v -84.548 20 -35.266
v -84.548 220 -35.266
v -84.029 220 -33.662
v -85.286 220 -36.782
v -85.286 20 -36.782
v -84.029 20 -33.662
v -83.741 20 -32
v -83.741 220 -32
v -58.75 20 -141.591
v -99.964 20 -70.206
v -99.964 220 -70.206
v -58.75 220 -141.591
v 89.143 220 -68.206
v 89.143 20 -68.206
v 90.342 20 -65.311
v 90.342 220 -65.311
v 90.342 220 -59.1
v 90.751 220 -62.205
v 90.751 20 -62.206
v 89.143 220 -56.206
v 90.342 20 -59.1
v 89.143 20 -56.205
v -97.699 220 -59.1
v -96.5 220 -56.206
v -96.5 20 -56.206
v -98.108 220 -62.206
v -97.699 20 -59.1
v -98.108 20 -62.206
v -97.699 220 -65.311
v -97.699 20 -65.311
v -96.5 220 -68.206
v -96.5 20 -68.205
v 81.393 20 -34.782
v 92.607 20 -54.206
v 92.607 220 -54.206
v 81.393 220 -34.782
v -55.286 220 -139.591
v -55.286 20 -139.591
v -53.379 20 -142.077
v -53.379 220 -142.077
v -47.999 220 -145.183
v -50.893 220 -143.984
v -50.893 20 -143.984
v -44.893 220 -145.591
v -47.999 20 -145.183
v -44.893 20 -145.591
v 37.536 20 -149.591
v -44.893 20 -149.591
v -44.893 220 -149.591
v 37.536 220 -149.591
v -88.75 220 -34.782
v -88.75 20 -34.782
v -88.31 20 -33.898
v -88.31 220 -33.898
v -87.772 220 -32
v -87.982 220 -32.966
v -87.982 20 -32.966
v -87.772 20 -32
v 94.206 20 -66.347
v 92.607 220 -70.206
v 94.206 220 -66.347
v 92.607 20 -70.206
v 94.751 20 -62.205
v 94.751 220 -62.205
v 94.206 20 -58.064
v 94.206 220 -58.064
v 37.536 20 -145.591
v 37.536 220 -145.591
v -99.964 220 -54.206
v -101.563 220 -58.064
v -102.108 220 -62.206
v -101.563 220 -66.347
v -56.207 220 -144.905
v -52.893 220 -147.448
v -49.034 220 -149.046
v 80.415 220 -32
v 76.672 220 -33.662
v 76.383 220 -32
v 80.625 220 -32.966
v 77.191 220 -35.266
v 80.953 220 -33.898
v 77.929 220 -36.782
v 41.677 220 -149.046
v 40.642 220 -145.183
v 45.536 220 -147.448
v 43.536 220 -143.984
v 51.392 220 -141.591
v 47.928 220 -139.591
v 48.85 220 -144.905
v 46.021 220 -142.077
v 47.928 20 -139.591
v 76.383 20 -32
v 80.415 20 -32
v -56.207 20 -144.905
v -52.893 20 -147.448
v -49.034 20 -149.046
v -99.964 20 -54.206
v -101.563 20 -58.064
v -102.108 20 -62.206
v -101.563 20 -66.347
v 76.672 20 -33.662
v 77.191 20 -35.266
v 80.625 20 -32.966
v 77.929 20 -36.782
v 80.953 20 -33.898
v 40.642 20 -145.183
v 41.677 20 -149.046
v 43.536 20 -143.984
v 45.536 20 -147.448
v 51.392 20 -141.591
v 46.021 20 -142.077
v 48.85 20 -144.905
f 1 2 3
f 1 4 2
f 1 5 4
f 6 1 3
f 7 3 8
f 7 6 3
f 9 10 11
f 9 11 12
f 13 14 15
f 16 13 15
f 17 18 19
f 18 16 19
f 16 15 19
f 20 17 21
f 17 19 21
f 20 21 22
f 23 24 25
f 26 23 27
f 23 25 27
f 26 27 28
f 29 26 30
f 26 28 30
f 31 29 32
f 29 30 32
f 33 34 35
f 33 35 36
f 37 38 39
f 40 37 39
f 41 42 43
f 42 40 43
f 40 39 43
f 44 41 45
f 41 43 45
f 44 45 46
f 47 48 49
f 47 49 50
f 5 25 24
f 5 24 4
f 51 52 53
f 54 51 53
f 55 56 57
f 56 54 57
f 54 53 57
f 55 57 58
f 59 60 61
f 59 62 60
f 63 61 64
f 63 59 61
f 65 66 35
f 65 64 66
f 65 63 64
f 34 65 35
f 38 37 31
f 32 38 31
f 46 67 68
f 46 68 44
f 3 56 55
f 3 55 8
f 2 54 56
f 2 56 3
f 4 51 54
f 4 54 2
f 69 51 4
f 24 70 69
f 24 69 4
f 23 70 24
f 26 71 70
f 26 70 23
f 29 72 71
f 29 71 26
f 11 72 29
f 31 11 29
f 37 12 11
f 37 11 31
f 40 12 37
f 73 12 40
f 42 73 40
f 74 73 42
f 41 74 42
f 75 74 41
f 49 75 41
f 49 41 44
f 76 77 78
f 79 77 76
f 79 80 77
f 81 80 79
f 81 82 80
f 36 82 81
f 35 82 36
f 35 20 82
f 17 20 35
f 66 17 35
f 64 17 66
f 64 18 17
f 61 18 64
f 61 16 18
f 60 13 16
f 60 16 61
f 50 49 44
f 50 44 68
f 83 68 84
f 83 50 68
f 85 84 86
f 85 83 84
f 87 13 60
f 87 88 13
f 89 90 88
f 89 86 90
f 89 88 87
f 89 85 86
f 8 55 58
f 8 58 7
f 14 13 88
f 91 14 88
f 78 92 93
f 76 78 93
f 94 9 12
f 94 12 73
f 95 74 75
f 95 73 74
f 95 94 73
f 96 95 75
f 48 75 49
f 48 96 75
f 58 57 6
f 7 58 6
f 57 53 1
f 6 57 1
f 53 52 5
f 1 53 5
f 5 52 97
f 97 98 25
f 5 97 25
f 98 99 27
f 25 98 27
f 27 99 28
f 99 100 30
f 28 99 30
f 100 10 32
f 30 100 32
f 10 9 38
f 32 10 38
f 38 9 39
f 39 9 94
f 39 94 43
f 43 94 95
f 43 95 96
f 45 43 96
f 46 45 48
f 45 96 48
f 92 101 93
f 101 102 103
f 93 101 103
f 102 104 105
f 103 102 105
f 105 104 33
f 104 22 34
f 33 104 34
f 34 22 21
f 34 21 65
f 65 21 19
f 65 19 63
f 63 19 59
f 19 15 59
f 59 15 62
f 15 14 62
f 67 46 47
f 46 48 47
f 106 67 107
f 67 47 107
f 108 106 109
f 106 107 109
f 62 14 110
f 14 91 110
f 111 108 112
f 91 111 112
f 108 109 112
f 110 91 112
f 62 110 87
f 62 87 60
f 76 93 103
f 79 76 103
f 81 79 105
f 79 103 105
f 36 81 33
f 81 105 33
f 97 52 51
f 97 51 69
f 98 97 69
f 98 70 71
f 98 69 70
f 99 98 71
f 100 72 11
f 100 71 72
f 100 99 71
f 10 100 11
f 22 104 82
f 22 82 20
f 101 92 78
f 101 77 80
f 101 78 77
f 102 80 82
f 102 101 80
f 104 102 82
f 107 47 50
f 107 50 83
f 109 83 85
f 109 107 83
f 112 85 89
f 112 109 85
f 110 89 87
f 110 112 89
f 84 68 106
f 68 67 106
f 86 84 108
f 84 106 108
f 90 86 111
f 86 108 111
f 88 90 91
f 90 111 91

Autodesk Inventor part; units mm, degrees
ref_plane "YZ Plane" through (0, 0, 0) normal (1, 0, 0) x (0, 1, 0)
ref_plane "XZ Plane" through (0, 0, 0) normal (0, 1, 0) x (-1, 0, 0)
ref_plane "XY Plane" through (0, 0, 0) normal (0, 0, 1) x (1, 0, 0)
sketch "Sketch1" plane through (0, 0, 0) normal (0, 1, 0) x (-1, 0, 0)
  line L0 (83.6786, 197.7945) -> (-76.3214, 197.7945)
  line L1 (-76.3214, 197.7945) -> (-76.3214, -52.2055)
  line L2 (-76.3214, -52.2055) -> (83.6786, -52.2055)
  line L3 (83.6786, -52.2055) -> (83.6786, 197.7945)
  circle A0 centre (3.6786, -62.2055) radius 80
  line L4 (83.6786, -52.2055) -> (83.6786, -62.2055)
  line L5 (-76.3214, -52.2055) -> (-76.3214, -62.2055)
  circle A1 centre (3.6786, -62.2055) radius 26
  circle A2 centre (3.6786, -62.2055) radius 40
  point P0 (0, 0)
  point P1 (59.3929, -23.6341)
  point P2 (-75.6939, -52.2055)
  point P3 (83.0512, -52.2055)
  dimension "d0" = 250
  dimension "d1" = 160
  dimension "d2" = 160
  dimension "d3" = 10
  dimension "d4" = 52
  dimension "d5" = 80
extrude "Extrusion1" add sketch "Sketch1" along normal blind 20 contours L3 L2 A0 L1 L0 | L4 A0 L2 | L2 A0 L5 | A0 L2 A2 | L2 A2 A0 | A2 L2 A1 | L2 A1 A2
sketch "Sketch2" plane through (0, 20, 0) normal (0, 1, 0) x (1, 0, 0)
  circle A0 centre (-3.6786, 62.2055) radius 26 projected
  circle A1 centre (-3.6786, 62.2055) radius 26
  circle A2 centre (-3.6786, 62.2055) radius 17
  point P0 (0, 0)
  dimension "d8" = 34
extrude "Extrusion2" add sketch "Sketch2" against normal blind 5
sketch "Sketch3" plane through (0, 0, 0) normal (0, -1, 0) x (1, 0, 0)
  circle A0 centre (-3.6786, -62.2055) radius 75
  circle A1 centre (-3.6786, -62.2055) radius 75
  line L0 (92.6071, -62.2055) -> (44.4642, -145.5914)
  line L1 (44.4642, -145.5914) -> (-51.8215, -145.5914)
  line L2 (-51.8215, -145.5914) -> (-99.9643, -62.2055)
  line L3 (-99.9643, -62.2055) -> (-51.8215, 21.1804)
  line L4 (-51.8215, 21.1804) -> (44.4642, 21.1804)
  line L5 (44.4642, 21.1804) -> (92.6071, -62.2055)
  line L6 (80.6071, -62.2055) -> (38.4642, -135.1991)
  line L7 (38.4642, -135.1991) -> (-45.8215, -135.1991)
  line L8 (-45.8215, -135.1991) -> (-87.9643, -62.2055)
  line L9 (-87.9643, -62.2055) -> (-45.8215, 10.7881)
  line L10 (-45.8215, 10.7881) -> (38.4642, 10.7881)
  line L11 (38.4642, 10.7881) -> (80.6071, -62.2055)
  circle A2 centre (80.6071, -62.2055) radius 5
  circle A3 centre (38.4642, 10.7881) radius 5
  circle A4 centre (-45.8215, 10.7881) radius 5
  circle A5 centre (-87.9643, -62.2055) radius 5
  circle A6 centre (-45.8215, -135.1991) radius 5
  circle A7 centre (38.4642, -135.1991) radius 5
  circle A8 centre (-3.6786, -62.2055) radius 26 projected
  circle A9 centre (-3.6786, -62.2055) radius 0.8535
  point P0 (0, 0)
  point P1 (-59.3929, -100.7769)
  point P2 (-3.6786, -62.2055)
  dimension "d13" = 360
sketch "Sketch4" plane through (0, 0, 0) normal (0, -1, 0) x (1, 0, 0)
  circle A0 centre (-45.8215, -135.1991) radius 5
  line L0 (-45.8215, -135.1991) -> (-87.9643, -62.2055)
  line L1 (-51.8215, -145.5914) -> (-99.9643, -62.2055)
  circle A1 centre (-87.9643, -62.2055) radius 5
  circle A2 centre (-45.8215, 10.7881) radius 5
  line L2 (-87.9643, -62.2055) -> (-45.8215, 10.7881)
  line L3 (-99.9643, -62.2055) -> (-51.8215, 21.1804)
  line L4 (38.4642, -135.1991) -> (-45.8215, -135.1991)
  circle A3 centre (38.4642, -135.1991) radius 5
  line L5 (44.4642, -145.5914) -> (-51.8215, -145.5914)
  line L6 (80.6071, -62.2055) -> (38.4642, -135.1991)
  line L7 (92.6071, -62.2055) -> (44.4642, -145.5914)
  circle A4 centre (-3.6786, -62.2055) radius 75
  circle A5 centre (-3.6786, -62.2055) radius 75
  line L8 (-45.8215, 10.7881) -> (38.4642, 10.7881)
  line L9 (-51.8215, 21.1804) -> (44.4642, 21.1804)
  circle A6 centre (80.6071, -62.2055) radius 5
  circle A7 centre (38.4642, 10.7881) radius 5
  line L10 (38.4642, 10.7881) -> (80.6071, -62.2055)
  line L11 (44.4642, 21.1804) -> (92.6071, -62.2055)
  circle A8 centre (-3.6786, -62.2055) radius 26
  circle A9 centre (-3.6786, -62.2055) radius 17 projected
  circle A10 centre (-3.6786, -62.2055) radius 2.3214
  point P0 (0, 0)
  point P1 (0, 0)
  point P2 (-59.3929, -100.7769)
  dimension "d18" = 360
extrude "Extrusion3" cut sketch "Sketch3" against normal blind 22 contours A2 L6 L11 | L11 L6 A2 | A3 L10 L11 | L11 L10 A3 | A7 L7 L6 | L6 L7 A7 | A4 L9 L10 | L10 L9 A4 | A6 L8 L7 | L7 L8 A6 | A5 L8 L9 | L9 L8 A5
extrude "Extrusion4" add sketch "Sketch4" against normal blind 20 contours A0 L0 A4 L4 | A4 L6 A3 L4 | L0 A1 L2 A4 | A4 L10 A6 L6 | L2 A2 L8 A4 | L8 A7 L10 A4 | L1 L3 L9 L11 L7 L5
sketch "Sketch5" plane through (0, 0, 0) normal (0, -1, 0) x (1, 0, 0)
  circle A0 centre (-3.6786, -62.2055) radius 17 projected
  circle A1 centre (-3.6786, -62.2055) radius 79.2857
  circle A2 centre (80.6071, -62.2055) radius 5 projected
  circle A3 centre (-3.6786, -62.2055) radius 75
  point P0 (0, 0)
  dimension "d21" = 150
extrude "Extrusion5" add sketch "Sketch5" along normal blind 5 contours A1
fillet "Fillet1" radius 12 4 edges at (-99.9643, 10, -62.2055) (-51.8215, 10, -145.5914) (44.4642, 10, -145.5914) (92.6071, 10, -62.2055)
sketch "Sketch6" plane through (0, 0, 0) normal (0, -1, 0) x (1, 0, 0)
  arc A0 (89.143, -68.2055) -> (89.143, -56.2055) centre (78.7507, -62.2055) ccw projected
  line L0 (89.143, -56.2055) -> (77.9291, -36.7824) projected
  arc A1 (76.3214, -30.7824) -> (77.9291, -36.7824) centre (88.3214, -30.7824) ccw projected
  line L1 (76.3214, 197.7945) -> (76.3214, -30.7824) projected
  line L2 (-83.6786, 197.7945) -> (76.3214, 197.7945) projected
  line L3 (-83.6786, -30.7824) -> (-83.6786, 197.7945) projected
  arc A2 (-85.2863, -36.7824) -> (-83.6786, -30.7824) centre (-95.6786, -30.7824) ccw projected
  line L4 (-85.2863, -36.7824) -> (-96.5002, -56.2055) projected
  arc A3 (-96.5002, -56.2055) -> (-96.5002, -68.2055) centre (-86.1079, -62.2055) ccw projected
  line L5 (-96.5002, -68.2055) -> (-55.2856, -139.5914) projected
  arc A4 (-55.2856, -139.5914) -> (-44.8933, -145.5914) centre (-44.8933, -133.5914) ccw projected
  line L6 (-44.8933, -145.5914) -> (37.536, -145.5914) projected
  arc A5 (37.536, -145.5914) -> (47.9283, -139.5914) centre (37.536, -133.5914) ccw projected
  line L7 (47.9283, -139.5914) -> (89.143, -68.2055) projected
  circle A6 centre (-87.9643, -62.2055) radius 5 projected
  arc A7 (-43.3215, 6.4579) -> (-82.9643, -62.2055) centre (-3.6786, -62.2055) ccw projected
  circle A8 centre (-45.8215, 10.7881) radius 5 projected
  arc A9 (35.9642, 6.4579) -> (-43.3215, 6.4579) centre (-3.6786, -62.2055) ccw projected
  circle A10 centre (38.4642, 10.7881) radius 5 projected
  arc A11 (75.6071, -62.2055) -> (35.9642, 6.4579) centre (-3.6786, -62.2055) ccw projected
  circle A12 centre (80.6071, -62.2055) radius 5 projected
  arc A13 (35.9642, -130.869) -> (75.6071, -62.2055) centre (-3.6786, -62.2055) ccw projected
  circle A14 centre (38.4642, -135.1991) radius 5 projected
  arc A15 (-43.3215, -130.869) -> (35.9642, -130.869) centre (-3.6786, -62.2055) ccw projected
  circle A16 centre (-45.8215, -135.1991) radius 5 projected
  arc A17 (-82.9643, -62.2055) -> (-43.3215, -130.869) centre (-3.6786, -62.2055) ccw projected
  arc A18 (56.3214, -30.7824) -> (60.6086, -46.7824) centre (88.3214, -30.7824) ccw
  line L8 (60.6086, -46.7824) -> (69.5131, -62.2055)
  line L9 (69.5131, -62.2055) -> (32.9172, -125.5914)
  line L10 (32.9172, -125.5914) -> (-40.2745, -125.5914)
  line L11 (-40.2745, -125.5914) -> (-76.8703, -62.2055)
  line L12 (-76.8703, -62.2055) -> (-67.9658, -46.7824)
  arc A19 (-67.9658, -46.7824) -> (-63.6786, -30.7824) centre (-95.6786, -30.7824) ccw
  line L13 (-63.6786, -30.7824) -> (-63.6786, 177.7945)
  line L14 (-63.6786, 177.7945) -> (56.3214, 177.7945)
  line L15 (56.3214, 177.7945) -> (56.3214, -30.7824)
  arc A20 (-53.3215, 23.7784) -> (-102.9643, -62.2055) centre (-3.6786, -62.2055) ccw
  arc A21 (-102.9643, -62.2055) -> (-53.3215, -148.1895) centre (-3.6786, -62.2055) ccw
  arc A22 (-53.3215, -148.1895) -> (45.9642, -148.1895) centre (-3.6786, -62.2055) ccw
  arc A23 (45.9642, -148.1895) -> (95.6071, -62.2055) centre (-3.6786, -62.2055) ccw
  arc A24 (95.6071, -62.2055) -> (45.9642, 23.7784) centre (-3.6786, -62.2055) ccw
  arc A25 (45.9642, 23.7784) -> (-53.3215, 23.7784) centre (-3.6786, -62.2055) ccw
  point P0 (0, 0)
  point P1 (-63.6786, 16.8998)
  point P2 (56.3214, 16.8998)
  dimension "d25" = 20
  dimension "d26" = 20
extrude "Extrusion6" cut sketch "Sketch6" against normal blind 12
sketch "Sketch7" plane through (0, 0, 0) normal (0, -1, 0) x (1, 0, 0)
  circle A0 centre (-3.6786, 22.0805) radius 5
  circle A1 centre (-3.6786, -62.2055) radius 17 projected
  circle A2 centre (-25.4934, 19.2085) radius 5
  circle A3 centre (-45.8216, 10.7883) radius 5
  circle A4 centre (-63.2778, -2.6063) radius 5
  circle A5 centre (-76.6724, -20.0625) radius 5
  circle A6 centre (-85.0926, -40.3907) radius 5
  circle A7 centre (-87.9646, -62.2055) radius 5
  circle A8 centre (-85.0926, -84.0203) radius 5
  circle A9 centre (-76.6724, -104.3485) radius 5
  circle A10 centre (-63.2778, -121.8047) radius 5
  circle A11 centre (-45.8216, -135.1993) radius 5
  circle A12 centre (-25.4934, -143.6195) radius 5
  circle A13 centre (-3.6786, -146.4915) radius 5
  circle A14 centre (18.1362, -143.6195) radius 5
  circle A15 centre (38.4644, -135.1993) radius 5
  circle A16 centre (55.9206, -121.8047) radius 5
  circle A17 centre (69.3152, -104.3485) radius 5
  circle A18 centre (77.7354, -84.0203) radius 5
  circle A19 centre (80.6074, -62.2055) radius 5
  circle A20 centre (77.7354, -40.3907) radius 5
  circle A21 centre (69.3152, -20.0625) radius 5
  circle A22 centre (55.9206, -2.6063) radius 5
  circle A23 centre (38.4644, 10.7883) radius 5
  circle A24 centre (18.1362, 19.2085) radius 5
  point P0 (0, 0)
  dimension "d29" = 84.286
  dimension "d30" = 10
  dimension "d33" = 360
extrude "Extrusion7" cut sketch "Sketch7" against normal blind 39 contours A0 | A2 | A4 | A5 | A21 | A22 | A24
sketch "Sketch8" plane through (0, 20, 0) normal (0, 1, 0) x (1, 0, 0)
  circle A0 centre (18.1362, -19.2085) radius 5 projected
  circle A1 centre (-76.6724, 20.0625) radius 5 projected
  circle A2 centre (55.9206, 2.6063) radius 5 projected
  circle A3 centre (-3.6786, -22.0805) radius 5 projected
  circle A4 centre (-63.2778, 2.6063) radius 5 projected
  circle A5 centre (69.3152, 20.0625) radius 5 projected
  circle A6 centre (-25.4934, -19.2085) radius 5 projected
  arc A7 (89.143, 56.2055) -> (89.143, 68.2055) centre (78.7507, 62.2055) ccw projected
  line L0 (89.143, 68.2055) -> (47.9283, 139.5914) projected
  arc A8 (47.9283, 139.5914) -> (37.536, 145.5914) centre (37.536, 133.5914) ccw projected
  line L1 (37.536, 145.5914) -> (-44.8933, 145.5914) projected
  arc A9 (-44.8933, 145.5914) -> (-55.2856, 139.5914) centre (-44.8933, 133.5914) ccw projected
  line L2 (-55.2856, 139.5914) -> (-96.5002, 68.2055) projected
  arc A10 (-96.5002, 68.2055) -> (-96.5002, 56.2055) centre (-86.1079, 62.2055) ccw projected
  line L3 (-96.5002, 56.2055) -> (-85.2863, 36.7824) projected
  arc A11 (-83.6786, 30.7824) -> (-85.2863, 36.7824) centre (-95.6786, 30.7824) ccw projected
  line L4 (-83.6786, 30.7824) -> (-83.6786, -197.7945) projected
  line L5 (-83.6786, -197.7945) -> (76.3214, -197.7945) projected
  line L6 (76.3214, -197.7945) -> (76.3214, 30.7824) projected
  arc A12 (77.9291, 36.7824) -> (76.3214, 30.7824) centre (88.3214, 30.7824) ccw projected
  line L7 (77.9291, 36.7824) -> (89.143, 56.2055) projected
  circle A13 centre (-3.6786, 62.2055) radius 17 projected
  circle A14 centre (38.4642, -10.7881) radius 5 projected
  circle A15 centre (-45.8215, -10.7881) radius 5 projected
  circle A16 centre (80.6071, 62.2055) radius 5 projected
  circle A17 centre (38.4642, 135.1991) radius 5 projected
  circle A18 centre (-45.8215, 135.1991) radius 5 projected
  circle A19 centre (-87.9643, 62.2055) radius 5 projected
  line L8 (51.3924, 141.5914) -> (92.6071, 70.2055)
  arc A20 (92.6071, 54.2055) -> (92.6071, 70.2055) centre (78.7507, 62.2055) ccw
  line L9 (92.6071, 54.2055) -> (81.3932, 34.7824)
  arc A21 (81.3932, 34.7824) -> (80.3214, 30.7824) centre (88.3214, 30.7824) ccw
  line L10 (80.3214, 30.7824) -> (80.3214, -201.7945)
  line L11 (80.3214, -201.7945) -> (-87.6786, -201.7945)
  line L12 (-87.6786, -201.7945) -> (-87.6786, 30.7824)
  arc A22 (-87.6786, 30.7824) -> (-88.7504, 34.7824) centre (-95.6786, 30.7824) ccw
  line L13 (-88.7504, 34.7824) -> (-99.9643, 54.2055)
  arc A23 (-99.9643, 70.2055) -> (-99.9643, 54.2055) centre (-86.1079, 62.2055) ccw
  line L14 (-99.9643, 70.2055) -> (-58.7497, 141.5914)
  arc A24 (-44.8933, 149.5914) -> (-58.7497, 141.5914) centre (-44.8933, 133.5914) ccw
  line L15 (-44.8933, 149.5914) -> (37.536, 149.5914)
  arc A25 (51.3924, 141.5914) -> (37.536, 149.5914) centre (37.536, 133.5914) ccw
  line L16 (80.3214, 30.7824) -> (80.3214, 12)
  line L17 (-87.6786, 12) -> (-87.6786, 30.7824)
  line L18 (-90, 32) -> (98, 32)
  line L19 (98, 32) -> (98, 12)
  line L20 (98, 12) -> (-90, 12)
  line L21 (-90, 12) -> (-90, 32)
  point P0 (0, 0)
  point P1 (76.3833, 32)
  point P2 (80.4146, 32)
  point P3 (-87.7718, 32)
  point P4 (-83.7405, 32)
  dimension "d37" = 4
extrude "Extrusion8" add sketch "Sketch8" along normal blind 200 contours A7 L0 A8 L1 A9 L2 A10 L3 A11 L18 A22 L13 A23 L14 A24 L15 A25 L8 A20 L9 A21 A12 L7
sketch "Sketch9" plane through (0, 20, 0) normal (0, 1, 0) x (1, 0, 0)
  circle A0 centre (18.1362, -19.2085) radius 5 projected
  circle A1 centre (-76.6724, 20.0625) radius 5 projected
  circle A2 centre (55.9206, 2.6063) radius 5 projected
  circle A3 centre (-3.6786, -22.0805) radius 5 projected
  circle A4 centre (-63.2778, 2.6063) radius 5 projected
  circle A5 centre (69.3152, 20.0625) radius 5 projected
  circle A6 centre (-25.4934, -19.2085) radius 5 projected
  arc A7 (89.143, 56.2055) -> (89.143, 68.2055) centre (78.7507, 62.2055) ccw projected
  line L0 (89.143, 68.2055) -> (47.9283, 139.5914) projected
  arc A8 (47.9283, 139.5914) -> (37.536, 145.5914) centre (37.536, 133.5914) ccw projected
  line L1 (37.536, 145.5914) -> (-44.8933, 145.5914) projected
  arc A9 (-44.8933, 145.5914) -> (-55.2856, 139.5914) centre (-44.8933, 133.5914) ccw projected
  line L2 (-55.2856, 139.5914) -> (-96.5002, 68.2055) projected
  arc A10 (-96.5002, 68.2055) -> (-96.5002, 56.2055) centre (-86.1079, 62.2055) ccw projected
  line L3 (-96.5002, 56.2055) -> (-85.2863, 36.7824) projected
  arc A11 (-83.7405, 32) -> (-85.2863, 36.7824) centre (-95.6786, 30.7824) ccw projected
  line L4 (-83.6786, 30.7824) -> (-83.6786, -197.7945) projected
  line L5 (-83.6786, -197.7945) -> (76.3214, -197.7945) projected
  line L6 (76.3214, -197.7945) -> (76.3214, 30.7824) projected
  arc A12 (77.9291, 36.7824) -> (76.3833, 32) centre (88.3214, 30.7824) ccw projected
  line L7 (77.9291, 36.7824) -> (89.143, 56.2055) projected
  circle A13 centre (-3.6786, 62.2055) radius 17 projected
  circle A14 centre (38.4642, -10.7881) radius 5 projected
  circle A15 centre (-45.8215, -10.7881) radius 5 projected
  circle A16 centre (80.6071, 62.2055) radius 5 projected
  circle A17 centre (38.4642, 135.1991) radius 5 projected
  circle A18 centre (-45.8215, 135.1991) radius 5 projected
  circle A19 centre (-87.9643, 62.2055) radius 5 projected
  arc A20 (-83.6786, 30.7824) -> (-83.7405, 32) centre (-95.6786, 30.7824) ccw projected
  arc A21 (76.3833, 32) -> (76.3214, 30.7824) centre (88.3214, 30.7824) ccw projected
  point P0 (0, 0)
extrude "Extrusion9" cut sketch "Sketch9" against normal blind 200
properties part number "ZadKriska" material "PMMA Plastic"
